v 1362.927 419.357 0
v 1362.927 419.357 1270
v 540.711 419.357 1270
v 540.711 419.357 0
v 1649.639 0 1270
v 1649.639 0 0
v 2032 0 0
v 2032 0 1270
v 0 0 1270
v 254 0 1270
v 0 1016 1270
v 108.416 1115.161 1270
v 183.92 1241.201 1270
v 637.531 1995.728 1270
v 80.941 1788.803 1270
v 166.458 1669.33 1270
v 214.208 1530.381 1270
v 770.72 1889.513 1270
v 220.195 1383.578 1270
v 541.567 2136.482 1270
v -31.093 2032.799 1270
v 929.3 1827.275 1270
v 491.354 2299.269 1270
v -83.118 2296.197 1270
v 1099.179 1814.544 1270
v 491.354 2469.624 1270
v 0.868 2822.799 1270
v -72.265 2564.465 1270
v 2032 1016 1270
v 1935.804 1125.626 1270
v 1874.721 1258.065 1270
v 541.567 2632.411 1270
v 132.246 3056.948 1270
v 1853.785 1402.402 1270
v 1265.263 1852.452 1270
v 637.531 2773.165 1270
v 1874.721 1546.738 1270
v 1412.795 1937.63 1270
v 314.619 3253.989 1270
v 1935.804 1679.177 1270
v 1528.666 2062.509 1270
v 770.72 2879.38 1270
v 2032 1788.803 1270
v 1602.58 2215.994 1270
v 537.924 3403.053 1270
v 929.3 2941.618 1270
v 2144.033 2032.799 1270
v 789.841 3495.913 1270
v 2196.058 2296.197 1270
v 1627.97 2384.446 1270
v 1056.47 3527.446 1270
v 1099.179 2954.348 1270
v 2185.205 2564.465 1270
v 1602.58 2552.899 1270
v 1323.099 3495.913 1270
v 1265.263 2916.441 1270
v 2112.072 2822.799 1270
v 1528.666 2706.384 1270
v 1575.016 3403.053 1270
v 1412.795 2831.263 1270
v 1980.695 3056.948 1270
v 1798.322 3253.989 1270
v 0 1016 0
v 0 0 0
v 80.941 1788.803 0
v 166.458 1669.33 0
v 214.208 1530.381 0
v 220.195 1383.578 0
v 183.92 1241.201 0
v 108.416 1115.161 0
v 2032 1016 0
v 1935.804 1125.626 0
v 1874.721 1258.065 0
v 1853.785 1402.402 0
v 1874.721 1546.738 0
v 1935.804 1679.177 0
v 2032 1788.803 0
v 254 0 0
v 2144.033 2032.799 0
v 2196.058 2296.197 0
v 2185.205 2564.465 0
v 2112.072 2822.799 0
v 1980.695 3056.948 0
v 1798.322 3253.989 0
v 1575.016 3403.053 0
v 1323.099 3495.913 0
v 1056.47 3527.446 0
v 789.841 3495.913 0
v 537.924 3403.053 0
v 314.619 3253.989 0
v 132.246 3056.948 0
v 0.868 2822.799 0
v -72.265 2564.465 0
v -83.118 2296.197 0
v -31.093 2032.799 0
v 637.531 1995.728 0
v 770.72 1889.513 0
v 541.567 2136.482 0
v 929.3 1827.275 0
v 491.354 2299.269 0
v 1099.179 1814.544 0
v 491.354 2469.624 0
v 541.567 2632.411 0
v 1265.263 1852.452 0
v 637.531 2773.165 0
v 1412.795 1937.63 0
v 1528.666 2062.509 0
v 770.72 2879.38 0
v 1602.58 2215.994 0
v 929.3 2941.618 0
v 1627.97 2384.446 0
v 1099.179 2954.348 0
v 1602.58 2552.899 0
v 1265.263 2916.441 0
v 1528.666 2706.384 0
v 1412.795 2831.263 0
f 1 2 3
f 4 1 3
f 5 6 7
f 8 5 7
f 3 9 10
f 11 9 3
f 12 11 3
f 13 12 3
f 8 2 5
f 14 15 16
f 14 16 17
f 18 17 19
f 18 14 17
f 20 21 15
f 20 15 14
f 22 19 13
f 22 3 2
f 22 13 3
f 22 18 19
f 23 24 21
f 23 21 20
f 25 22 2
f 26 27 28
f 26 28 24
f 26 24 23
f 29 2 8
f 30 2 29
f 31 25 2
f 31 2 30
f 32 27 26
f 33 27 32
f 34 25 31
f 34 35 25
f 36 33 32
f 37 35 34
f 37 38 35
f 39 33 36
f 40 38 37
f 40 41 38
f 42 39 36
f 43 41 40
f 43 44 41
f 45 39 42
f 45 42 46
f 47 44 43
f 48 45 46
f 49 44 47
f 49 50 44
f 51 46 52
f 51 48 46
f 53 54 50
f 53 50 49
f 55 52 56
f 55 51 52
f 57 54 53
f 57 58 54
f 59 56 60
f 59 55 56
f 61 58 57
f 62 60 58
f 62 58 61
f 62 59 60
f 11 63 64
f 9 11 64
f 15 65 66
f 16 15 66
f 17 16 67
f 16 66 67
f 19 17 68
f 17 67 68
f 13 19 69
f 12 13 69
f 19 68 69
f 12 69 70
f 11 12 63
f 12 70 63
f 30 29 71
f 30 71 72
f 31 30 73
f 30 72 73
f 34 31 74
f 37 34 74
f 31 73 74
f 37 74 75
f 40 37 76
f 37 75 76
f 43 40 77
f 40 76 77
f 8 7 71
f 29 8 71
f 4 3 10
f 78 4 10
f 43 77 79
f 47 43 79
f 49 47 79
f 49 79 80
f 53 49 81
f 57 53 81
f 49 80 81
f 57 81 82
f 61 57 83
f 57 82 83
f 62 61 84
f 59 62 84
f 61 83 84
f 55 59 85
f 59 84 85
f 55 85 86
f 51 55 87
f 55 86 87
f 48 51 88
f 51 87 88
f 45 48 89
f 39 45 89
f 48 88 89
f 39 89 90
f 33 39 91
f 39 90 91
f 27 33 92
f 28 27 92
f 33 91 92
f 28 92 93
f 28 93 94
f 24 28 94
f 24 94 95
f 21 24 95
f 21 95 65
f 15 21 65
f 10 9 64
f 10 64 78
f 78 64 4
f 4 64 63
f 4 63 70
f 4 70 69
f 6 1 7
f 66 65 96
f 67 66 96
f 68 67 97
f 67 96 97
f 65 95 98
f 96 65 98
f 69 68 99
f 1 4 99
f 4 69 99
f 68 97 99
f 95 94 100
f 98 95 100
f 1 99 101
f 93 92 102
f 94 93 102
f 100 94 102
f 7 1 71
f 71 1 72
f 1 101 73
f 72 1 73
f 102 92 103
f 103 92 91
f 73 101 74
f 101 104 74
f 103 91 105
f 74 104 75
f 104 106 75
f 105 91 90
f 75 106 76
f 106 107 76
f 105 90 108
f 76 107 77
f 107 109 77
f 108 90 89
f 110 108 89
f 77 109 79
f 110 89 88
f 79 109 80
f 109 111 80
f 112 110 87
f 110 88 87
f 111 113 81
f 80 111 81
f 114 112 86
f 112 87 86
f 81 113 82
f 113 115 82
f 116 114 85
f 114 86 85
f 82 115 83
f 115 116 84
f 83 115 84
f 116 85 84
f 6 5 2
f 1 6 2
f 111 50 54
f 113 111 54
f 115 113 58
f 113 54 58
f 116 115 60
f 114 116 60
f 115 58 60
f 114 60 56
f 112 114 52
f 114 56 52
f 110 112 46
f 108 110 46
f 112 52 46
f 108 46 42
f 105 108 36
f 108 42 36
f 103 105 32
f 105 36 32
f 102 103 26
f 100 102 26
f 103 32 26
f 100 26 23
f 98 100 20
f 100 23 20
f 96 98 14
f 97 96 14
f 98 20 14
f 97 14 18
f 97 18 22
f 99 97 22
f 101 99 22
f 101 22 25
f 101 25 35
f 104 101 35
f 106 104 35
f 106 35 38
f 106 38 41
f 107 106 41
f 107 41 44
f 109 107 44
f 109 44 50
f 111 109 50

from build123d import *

# Parameters (mm, degrees)
F1_DEPTH = 1270
F2_R     = 571.5
F3_DEPTH = 1270.001


with BuildPart() as f1:
    # F0 (on Top) → F1 (new body)
    with BuildSketch(Plane.XY):
        with BuildLine():
            Line((0, 1016), (0, 0))
            Line((0, 0), (254, 0))
            Line((254, 0), (2032, 0))
            Line((2032, 0), (2032, 1016))
            ThreePointArc((2032, 1016), (1853.784563, 1402.401529), (2032, 1788.803059))
            ThreePointArc((2032, 1788.803059), (1056.470322, 3527.446281), (80.940645, 1788.803059))
            ThreePointArc((80.940645, 1788.803059), (220.195309, 1383.577773), (0, 1016))
        make_face()
    extrude(amount=F1_DEPTH)

    # F2 (on face) → F3 (cut, through all)
    with BuildSketch(Plane.XY.offset(1270)):
        Polygon((540.711392, 419.357339), (254, 0), (1649.638772, 0), (1362.92738, 419.357339), align=None)
        with Locations((1056.470322, 2384.446281)):
            Circle(F2_R)
    extrude(amount=-F3_DEPTH, mode=Mode.SUBTRACT)


solid = f1.part
